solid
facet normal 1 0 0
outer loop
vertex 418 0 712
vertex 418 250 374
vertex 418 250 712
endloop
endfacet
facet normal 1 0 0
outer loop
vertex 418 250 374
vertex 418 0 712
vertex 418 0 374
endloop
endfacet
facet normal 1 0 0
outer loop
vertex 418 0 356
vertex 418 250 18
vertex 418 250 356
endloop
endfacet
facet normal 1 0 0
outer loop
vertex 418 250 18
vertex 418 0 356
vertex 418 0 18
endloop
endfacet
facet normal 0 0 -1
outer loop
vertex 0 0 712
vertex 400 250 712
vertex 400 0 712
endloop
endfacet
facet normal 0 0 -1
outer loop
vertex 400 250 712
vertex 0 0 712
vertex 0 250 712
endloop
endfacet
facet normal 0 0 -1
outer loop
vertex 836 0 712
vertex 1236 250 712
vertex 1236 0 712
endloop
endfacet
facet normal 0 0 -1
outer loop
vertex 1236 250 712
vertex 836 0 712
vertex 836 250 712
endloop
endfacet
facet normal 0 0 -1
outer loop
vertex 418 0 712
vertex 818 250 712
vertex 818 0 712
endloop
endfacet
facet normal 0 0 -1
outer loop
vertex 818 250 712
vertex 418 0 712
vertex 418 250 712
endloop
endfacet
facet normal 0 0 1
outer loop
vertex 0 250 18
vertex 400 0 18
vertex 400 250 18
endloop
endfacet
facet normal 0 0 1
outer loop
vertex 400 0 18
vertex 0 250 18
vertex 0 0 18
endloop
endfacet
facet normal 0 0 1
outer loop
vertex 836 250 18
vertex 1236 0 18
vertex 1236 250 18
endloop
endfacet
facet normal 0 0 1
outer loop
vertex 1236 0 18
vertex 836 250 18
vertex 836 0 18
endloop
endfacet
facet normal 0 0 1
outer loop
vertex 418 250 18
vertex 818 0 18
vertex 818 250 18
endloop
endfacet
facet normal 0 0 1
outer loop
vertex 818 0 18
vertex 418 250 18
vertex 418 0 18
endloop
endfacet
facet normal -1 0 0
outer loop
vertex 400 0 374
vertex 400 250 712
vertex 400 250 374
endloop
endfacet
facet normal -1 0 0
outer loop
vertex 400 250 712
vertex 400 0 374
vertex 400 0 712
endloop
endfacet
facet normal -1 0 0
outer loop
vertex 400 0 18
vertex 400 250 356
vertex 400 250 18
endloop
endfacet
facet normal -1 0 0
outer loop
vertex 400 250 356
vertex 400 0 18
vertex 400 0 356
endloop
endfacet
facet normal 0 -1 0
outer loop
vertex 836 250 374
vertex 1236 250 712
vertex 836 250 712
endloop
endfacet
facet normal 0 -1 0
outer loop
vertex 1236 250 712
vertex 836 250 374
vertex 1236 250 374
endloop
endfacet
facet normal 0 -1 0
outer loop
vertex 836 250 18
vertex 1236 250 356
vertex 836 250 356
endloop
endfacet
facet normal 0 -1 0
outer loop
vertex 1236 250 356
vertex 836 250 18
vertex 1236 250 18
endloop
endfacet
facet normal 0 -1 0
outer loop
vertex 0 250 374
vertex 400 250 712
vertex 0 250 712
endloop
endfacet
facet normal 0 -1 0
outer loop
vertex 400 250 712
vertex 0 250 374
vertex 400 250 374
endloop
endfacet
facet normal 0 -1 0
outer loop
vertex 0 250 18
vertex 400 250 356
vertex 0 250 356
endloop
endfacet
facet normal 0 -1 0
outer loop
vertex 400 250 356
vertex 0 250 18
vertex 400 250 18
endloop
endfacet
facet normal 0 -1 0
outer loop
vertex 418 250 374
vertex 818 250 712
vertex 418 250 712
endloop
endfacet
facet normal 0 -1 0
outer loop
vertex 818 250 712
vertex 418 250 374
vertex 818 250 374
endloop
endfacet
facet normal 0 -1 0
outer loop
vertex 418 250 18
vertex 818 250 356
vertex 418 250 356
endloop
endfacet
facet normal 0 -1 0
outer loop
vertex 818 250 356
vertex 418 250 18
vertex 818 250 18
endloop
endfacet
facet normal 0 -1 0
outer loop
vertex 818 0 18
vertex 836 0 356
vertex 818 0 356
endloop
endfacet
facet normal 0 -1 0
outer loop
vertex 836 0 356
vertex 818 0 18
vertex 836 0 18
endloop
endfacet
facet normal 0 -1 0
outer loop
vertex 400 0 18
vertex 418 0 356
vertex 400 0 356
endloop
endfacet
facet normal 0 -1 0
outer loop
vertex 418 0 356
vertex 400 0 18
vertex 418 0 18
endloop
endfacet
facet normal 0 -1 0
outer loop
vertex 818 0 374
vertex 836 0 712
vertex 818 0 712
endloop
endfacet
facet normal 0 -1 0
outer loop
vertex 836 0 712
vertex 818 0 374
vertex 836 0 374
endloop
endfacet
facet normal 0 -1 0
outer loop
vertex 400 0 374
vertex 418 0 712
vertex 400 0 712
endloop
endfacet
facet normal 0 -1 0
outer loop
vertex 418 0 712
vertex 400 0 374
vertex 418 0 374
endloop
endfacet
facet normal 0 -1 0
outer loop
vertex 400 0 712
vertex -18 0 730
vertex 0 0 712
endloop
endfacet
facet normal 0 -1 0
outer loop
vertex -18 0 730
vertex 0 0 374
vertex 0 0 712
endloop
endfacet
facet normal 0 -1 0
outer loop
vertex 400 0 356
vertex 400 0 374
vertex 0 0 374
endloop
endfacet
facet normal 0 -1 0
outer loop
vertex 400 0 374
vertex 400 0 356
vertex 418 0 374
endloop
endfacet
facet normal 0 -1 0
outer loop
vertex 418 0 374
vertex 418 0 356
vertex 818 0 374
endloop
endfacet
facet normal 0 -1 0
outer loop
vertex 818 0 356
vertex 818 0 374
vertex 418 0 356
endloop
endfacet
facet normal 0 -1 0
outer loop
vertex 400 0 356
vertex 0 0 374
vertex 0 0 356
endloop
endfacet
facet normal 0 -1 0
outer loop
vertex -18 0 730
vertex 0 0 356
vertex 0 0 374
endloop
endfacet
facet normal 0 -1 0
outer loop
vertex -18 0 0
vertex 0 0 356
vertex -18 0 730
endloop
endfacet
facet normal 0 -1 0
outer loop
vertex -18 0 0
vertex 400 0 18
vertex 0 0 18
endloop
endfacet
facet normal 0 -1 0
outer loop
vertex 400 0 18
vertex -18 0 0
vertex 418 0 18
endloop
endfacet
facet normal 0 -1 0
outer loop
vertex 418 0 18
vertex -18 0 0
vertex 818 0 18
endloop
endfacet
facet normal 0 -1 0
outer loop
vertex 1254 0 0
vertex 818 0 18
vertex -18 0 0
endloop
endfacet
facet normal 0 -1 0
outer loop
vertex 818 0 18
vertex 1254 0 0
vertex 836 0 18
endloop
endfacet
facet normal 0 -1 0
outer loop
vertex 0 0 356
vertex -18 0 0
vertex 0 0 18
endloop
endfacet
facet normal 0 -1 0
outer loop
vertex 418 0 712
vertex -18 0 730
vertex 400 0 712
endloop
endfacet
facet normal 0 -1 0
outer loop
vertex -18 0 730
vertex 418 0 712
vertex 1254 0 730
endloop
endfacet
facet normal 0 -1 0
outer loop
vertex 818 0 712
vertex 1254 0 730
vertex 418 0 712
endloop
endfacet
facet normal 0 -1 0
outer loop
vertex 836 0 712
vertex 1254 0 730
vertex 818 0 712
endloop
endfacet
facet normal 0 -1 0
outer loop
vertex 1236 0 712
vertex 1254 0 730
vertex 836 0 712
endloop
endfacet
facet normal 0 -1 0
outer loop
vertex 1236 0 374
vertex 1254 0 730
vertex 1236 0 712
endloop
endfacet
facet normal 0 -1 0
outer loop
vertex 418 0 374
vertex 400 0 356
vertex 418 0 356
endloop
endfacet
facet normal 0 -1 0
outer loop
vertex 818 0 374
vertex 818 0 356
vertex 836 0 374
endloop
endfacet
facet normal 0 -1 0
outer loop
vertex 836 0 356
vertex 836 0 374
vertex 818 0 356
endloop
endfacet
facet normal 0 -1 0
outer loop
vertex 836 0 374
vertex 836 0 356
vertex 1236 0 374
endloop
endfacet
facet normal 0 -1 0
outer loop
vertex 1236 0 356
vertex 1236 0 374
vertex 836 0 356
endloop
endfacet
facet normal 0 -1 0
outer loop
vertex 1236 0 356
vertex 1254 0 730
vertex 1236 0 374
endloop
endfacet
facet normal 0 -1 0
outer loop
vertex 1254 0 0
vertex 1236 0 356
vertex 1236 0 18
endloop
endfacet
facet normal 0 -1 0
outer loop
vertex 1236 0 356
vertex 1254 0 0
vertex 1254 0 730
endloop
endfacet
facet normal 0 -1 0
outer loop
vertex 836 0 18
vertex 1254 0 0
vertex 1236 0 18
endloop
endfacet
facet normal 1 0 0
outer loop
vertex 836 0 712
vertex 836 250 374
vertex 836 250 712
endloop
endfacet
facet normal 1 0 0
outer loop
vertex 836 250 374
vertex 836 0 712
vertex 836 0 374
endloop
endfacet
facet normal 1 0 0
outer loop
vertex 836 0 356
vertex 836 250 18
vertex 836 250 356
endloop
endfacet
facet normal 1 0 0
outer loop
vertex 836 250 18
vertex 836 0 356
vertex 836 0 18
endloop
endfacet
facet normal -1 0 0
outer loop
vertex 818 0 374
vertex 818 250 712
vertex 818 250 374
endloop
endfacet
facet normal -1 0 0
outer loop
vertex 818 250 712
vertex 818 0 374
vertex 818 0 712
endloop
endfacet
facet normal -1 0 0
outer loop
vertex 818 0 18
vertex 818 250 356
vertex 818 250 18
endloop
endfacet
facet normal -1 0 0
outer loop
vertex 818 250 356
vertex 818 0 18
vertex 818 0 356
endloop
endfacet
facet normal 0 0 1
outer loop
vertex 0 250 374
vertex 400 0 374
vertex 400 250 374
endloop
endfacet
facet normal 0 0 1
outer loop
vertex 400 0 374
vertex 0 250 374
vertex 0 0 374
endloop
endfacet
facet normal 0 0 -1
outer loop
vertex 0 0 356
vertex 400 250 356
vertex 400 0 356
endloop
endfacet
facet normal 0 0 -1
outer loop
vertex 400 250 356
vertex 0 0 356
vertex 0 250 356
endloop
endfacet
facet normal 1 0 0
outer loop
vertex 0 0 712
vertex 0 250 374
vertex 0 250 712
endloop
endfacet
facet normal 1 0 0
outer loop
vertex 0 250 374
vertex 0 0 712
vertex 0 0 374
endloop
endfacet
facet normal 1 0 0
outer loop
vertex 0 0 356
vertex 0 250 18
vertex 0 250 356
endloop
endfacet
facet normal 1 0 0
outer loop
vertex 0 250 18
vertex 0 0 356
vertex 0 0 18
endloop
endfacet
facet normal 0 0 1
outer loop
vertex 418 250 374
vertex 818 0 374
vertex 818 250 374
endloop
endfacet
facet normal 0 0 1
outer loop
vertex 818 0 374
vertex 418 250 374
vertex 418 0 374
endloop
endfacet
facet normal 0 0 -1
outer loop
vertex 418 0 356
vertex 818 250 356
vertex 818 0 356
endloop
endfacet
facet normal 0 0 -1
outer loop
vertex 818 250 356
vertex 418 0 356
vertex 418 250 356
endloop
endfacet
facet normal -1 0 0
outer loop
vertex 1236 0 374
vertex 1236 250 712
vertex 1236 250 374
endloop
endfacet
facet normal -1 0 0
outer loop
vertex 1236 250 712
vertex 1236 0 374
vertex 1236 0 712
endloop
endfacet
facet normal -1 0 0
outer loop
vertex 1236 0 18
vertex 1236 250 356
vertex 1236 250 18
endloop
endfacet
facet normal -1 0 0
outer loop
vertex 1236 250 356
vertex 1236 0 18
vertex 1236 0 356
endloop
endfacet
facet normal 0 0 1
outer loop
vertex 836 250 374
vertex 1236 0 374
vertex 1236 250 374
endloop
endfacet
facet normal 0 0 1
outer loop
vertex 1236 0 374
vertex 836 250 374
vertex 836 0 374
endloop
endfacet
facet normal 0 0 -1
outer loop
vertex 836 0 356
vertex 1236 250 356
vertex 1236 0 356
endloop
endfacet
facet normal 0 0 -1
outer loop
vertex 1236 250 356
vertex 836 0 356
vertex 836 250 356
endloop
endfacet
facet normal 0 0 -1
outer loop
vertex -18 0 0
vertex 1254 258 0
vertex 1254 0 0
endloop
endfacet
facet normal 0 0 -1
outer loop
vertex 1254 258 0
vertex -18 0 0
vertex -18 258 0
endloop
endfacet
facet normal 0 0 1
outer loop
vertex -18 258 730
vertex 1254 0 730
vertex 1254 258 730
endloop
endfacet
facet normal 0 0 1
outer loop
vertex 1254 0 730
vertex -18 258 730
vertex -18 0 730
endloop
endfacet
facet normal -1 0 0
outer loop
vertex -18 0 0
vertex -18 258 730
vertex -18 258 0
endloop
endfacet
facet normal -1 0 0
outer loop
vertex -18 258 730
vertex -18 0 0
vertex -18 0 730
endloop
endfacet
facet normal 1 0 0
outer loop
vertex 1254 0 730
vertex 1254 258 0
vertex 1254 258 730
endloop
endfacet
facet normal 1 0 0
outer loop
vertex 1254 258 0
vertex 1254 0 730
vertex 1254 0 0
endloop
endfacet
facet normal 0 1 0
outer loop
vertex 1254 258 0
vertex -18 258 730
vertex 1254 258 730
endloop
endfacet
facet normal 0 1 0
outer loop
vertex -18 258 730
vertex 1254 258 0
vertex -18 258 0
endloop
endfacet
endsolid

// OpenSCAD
// bottom
cube([1246, 250, 18], false);

// left
translate([-18, 0, 0])
	cube([18, 250, 730], false);
	
// right
translate([1236, 0, 0])
	cube([18, 250, 730], false);

// top
translate([0, 0, 712])
	cube([1246, 250, 18], false);
	
// back
translate([-18, 250, 0])
	cube([1272, 8, 730], false);

// vertical sides
for ( col = [0 : 1] ) {
	translate([400+col*400+col*18, 0, 18])
		cube([18, 250, 694], false);
}

// horizontal sides
for ( col = [0 : 2] ) {
	translate([col*400+col*18, 0, 356])
		cube([400, 250, 18], false);
}
